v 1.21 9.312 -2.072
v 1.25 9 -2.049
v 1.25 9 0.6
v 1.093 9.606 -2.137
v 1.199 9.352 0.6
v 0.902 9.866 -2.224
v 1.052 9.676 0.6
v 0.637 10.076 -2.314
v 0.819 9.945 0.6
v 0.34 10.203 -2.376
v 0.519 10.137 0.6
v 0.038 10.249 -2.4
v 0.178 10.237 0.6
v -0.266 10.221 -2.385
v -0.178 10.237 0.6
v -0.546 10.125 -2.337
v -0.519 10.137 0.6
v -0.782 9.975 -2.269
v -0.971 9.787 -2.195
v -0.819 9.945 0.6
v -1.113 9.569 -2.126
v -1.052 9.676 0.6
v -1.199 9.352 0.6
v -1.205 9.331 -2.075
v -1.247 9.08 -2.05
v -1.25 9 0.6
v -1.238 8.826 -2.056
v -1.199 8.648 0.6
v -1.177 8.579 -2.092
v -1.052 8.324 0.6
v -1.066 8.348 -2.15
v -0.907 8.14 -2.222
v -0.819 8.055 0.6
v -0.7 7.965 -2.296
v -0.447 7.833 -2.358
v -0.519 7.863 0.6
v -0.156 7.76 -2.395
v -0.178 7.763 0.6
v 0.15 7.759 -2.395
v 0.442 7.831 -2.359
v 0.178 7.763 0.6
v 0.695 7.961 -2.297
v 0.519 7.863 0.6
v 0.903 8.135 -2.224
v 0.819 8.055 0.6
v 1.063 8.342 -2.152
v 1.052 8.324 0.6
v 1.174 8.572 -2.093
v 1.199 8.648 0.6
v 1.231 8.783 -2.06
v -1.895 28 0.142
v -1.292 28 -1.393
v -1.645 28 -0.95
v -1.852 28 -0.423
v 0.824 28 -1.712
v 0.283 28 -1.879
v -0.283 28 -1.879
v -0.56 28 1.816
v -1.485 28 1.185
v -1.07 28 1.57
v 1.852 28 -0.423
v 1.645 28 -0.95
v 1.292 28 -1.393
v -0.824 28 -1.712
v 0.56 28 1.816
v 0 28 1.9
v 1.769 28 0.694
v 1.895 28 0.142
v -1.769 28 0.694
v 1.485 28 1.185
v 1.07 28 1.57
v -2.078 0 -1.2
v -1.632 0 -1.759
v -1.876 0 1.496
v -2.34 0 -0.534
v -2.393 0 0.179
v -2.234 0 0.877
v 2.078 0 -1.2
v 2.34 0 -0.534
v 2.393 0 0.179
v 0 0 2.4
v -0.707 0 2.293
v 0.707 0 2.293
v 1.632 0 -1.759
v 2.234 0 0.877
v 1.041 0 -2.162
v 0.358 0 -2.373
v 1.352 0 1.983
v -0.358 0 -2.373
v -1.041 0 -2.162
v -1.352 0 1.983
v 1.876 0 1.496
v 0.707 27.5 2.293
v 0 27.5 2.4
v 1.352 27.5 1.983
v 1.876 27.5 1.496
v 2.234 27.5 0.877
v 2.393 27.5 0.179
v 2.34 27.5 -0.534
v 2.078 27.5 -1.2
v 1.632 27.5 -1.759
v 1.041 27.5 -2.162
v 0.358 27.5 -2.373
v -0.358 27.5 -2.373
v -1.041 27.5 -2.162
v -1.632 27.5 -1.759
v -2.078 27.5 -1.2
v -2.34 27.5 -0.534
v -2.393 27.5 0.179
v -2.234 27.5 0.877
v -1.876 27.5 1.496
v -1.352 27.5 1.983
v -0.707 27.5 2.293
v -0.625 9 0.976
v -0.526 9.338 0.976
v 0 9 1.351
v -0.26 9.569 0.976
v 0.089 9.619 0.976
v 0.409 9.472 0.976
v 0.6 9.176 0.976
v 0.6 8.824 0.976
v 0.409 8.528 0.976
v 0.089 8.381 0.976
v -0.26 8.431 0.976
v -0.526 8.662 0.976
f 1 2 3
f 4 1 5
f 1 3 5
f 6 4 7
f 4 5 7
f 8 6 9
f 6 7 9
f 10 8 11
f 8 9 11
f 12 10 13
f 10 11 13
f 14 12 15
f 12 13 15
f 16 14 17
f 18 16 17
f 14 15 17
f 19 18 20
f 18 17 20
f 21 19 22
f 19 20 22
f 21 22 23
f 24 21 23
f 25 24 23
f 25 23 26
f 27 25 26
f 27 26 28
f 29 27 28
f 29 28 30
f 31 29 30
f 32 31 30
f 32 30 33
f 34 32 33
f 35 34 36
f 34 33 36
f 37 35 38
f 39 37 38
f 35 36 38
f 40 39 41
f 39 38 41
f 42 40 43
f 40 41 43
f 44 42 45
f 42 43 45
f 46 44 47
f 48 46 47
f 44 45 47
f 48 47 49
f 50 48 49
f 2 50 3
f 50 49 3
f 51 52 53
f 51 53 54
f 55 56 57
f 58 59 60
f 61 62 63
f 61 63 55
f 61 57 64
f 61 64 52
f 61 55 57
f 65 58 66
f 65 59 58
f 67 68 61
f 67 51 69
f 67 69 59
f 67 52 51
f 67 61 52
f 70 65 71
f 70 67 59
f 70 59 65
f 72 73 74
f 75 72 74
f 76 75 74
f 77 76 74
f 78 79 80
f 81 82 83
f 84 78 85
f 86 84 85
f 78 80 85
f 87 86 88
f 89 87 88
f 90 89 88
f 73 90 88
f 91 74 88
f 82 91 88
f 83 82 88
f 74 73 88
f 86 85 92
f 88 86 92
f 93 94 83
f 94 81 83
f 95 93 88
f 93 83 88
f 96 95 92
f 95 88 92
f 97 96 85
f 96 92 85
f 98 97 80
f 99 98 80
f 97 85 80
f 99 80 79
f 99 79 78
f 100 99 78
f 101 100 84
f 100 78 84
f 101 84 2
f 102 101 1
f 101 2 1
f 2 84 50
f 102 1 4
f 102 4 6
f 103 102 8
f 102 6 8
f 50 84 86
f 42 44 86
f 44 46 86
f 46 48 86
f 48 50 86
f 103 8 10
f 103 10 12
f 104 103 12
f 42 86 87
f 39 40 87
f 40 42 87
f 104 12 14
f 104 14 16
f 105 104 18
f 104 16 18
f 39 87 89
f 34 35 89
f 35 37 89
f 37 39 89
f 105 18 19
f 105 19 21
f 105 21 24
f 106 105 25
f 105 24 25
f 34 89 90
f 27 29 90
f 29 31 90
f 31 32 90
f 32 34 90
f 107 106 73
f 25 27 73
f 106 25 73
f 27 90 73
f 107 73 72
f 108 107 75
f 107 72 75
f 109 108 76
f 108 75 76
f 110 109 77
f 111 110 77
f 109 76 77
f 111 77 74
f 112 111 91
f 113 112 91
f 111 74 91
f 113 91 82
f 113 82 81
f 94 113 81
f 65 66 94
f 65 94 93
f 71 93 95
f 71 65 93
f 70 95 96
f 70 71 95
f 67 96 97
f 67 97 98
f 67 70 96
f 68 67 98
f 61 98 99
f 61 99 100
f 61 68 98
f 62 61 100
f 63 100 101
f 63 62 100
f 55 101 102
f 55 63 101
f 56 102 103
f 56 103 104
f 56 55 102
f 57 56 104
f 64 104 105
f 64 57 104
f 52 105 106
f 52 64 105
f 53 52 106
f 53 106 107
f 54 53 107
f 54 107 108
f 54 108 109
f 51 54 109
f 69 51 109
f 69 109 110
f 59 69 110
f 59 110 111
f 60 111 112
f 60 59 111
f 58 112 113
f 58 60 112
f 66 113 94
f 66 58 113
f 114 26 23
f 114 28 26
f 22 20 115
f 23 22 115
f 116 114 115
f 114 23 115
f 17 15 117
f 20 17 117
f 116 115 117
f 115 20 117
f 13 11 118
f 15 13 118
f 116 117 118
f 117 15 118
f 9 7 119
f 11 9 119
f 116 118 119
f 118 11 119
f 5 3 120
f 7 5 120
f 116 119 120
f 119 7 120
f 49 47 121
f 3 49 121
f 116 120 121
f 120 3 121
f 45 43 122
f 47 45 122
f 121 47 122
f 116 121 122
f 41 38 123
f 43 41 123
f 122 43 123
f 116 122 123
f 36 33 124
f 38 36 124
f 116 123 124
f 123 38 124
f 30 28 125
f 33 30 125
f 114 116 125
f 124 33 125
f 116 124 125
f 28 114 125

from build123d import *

# Parameters (mm, degrees)
SKETCH_1_R      = 2.4
EXTRUDE_1_DEPTH = 28
CHAMFER_1_SIZE  = 0.5
M3X0_51_D       = 2.5
M3X0_51_DEPTH   = 3
M3X0_51_TIP     = 0.751075774


with BuildPart() as part:
    # Эскиз1 → Бобышка-Вытянуть1 (new body)
    with BuildSketch(Plane(origin=(0, 0, 0), x_dir=(1, 0, 0), z_dir=(0, 1, 0))):
        with Locations(Location((0, 0, 0), (0, 0, 270))):
            Circle(SKETCH_1_R)
    extrude(amount=EXTRUDE_1_DEPTH)

    # Фаска1
    chamfer_1_edges = [part.edges().sort_by_distance(p)[0] for p in [
        (0, 28, -2.4),
    ]]
    chamfer(chamfer_1_edges, length=CHAMFER_1_SIZE)

    # Отверстие обработанное метчиком M3x0.51
    with Locations(Plane(origin=(0, 0, -2.4), x_dir=(-1, 0, 0), z_dir=(0, 0, -1))):
        with Locations((0, 9)):
            Hole(M3X0_51_D / 2, depth=M3X0_51_DEPTH)
            with Locations((0, 0, -(M3X0_51_DEPTH + M3X0_51_TIP / 2))):  # 118° drill point
                Cone(0, M3X0_51_D / 2, M3X0_51_TIP, mode=Mode.SUBTRACT)


solid = part.part
